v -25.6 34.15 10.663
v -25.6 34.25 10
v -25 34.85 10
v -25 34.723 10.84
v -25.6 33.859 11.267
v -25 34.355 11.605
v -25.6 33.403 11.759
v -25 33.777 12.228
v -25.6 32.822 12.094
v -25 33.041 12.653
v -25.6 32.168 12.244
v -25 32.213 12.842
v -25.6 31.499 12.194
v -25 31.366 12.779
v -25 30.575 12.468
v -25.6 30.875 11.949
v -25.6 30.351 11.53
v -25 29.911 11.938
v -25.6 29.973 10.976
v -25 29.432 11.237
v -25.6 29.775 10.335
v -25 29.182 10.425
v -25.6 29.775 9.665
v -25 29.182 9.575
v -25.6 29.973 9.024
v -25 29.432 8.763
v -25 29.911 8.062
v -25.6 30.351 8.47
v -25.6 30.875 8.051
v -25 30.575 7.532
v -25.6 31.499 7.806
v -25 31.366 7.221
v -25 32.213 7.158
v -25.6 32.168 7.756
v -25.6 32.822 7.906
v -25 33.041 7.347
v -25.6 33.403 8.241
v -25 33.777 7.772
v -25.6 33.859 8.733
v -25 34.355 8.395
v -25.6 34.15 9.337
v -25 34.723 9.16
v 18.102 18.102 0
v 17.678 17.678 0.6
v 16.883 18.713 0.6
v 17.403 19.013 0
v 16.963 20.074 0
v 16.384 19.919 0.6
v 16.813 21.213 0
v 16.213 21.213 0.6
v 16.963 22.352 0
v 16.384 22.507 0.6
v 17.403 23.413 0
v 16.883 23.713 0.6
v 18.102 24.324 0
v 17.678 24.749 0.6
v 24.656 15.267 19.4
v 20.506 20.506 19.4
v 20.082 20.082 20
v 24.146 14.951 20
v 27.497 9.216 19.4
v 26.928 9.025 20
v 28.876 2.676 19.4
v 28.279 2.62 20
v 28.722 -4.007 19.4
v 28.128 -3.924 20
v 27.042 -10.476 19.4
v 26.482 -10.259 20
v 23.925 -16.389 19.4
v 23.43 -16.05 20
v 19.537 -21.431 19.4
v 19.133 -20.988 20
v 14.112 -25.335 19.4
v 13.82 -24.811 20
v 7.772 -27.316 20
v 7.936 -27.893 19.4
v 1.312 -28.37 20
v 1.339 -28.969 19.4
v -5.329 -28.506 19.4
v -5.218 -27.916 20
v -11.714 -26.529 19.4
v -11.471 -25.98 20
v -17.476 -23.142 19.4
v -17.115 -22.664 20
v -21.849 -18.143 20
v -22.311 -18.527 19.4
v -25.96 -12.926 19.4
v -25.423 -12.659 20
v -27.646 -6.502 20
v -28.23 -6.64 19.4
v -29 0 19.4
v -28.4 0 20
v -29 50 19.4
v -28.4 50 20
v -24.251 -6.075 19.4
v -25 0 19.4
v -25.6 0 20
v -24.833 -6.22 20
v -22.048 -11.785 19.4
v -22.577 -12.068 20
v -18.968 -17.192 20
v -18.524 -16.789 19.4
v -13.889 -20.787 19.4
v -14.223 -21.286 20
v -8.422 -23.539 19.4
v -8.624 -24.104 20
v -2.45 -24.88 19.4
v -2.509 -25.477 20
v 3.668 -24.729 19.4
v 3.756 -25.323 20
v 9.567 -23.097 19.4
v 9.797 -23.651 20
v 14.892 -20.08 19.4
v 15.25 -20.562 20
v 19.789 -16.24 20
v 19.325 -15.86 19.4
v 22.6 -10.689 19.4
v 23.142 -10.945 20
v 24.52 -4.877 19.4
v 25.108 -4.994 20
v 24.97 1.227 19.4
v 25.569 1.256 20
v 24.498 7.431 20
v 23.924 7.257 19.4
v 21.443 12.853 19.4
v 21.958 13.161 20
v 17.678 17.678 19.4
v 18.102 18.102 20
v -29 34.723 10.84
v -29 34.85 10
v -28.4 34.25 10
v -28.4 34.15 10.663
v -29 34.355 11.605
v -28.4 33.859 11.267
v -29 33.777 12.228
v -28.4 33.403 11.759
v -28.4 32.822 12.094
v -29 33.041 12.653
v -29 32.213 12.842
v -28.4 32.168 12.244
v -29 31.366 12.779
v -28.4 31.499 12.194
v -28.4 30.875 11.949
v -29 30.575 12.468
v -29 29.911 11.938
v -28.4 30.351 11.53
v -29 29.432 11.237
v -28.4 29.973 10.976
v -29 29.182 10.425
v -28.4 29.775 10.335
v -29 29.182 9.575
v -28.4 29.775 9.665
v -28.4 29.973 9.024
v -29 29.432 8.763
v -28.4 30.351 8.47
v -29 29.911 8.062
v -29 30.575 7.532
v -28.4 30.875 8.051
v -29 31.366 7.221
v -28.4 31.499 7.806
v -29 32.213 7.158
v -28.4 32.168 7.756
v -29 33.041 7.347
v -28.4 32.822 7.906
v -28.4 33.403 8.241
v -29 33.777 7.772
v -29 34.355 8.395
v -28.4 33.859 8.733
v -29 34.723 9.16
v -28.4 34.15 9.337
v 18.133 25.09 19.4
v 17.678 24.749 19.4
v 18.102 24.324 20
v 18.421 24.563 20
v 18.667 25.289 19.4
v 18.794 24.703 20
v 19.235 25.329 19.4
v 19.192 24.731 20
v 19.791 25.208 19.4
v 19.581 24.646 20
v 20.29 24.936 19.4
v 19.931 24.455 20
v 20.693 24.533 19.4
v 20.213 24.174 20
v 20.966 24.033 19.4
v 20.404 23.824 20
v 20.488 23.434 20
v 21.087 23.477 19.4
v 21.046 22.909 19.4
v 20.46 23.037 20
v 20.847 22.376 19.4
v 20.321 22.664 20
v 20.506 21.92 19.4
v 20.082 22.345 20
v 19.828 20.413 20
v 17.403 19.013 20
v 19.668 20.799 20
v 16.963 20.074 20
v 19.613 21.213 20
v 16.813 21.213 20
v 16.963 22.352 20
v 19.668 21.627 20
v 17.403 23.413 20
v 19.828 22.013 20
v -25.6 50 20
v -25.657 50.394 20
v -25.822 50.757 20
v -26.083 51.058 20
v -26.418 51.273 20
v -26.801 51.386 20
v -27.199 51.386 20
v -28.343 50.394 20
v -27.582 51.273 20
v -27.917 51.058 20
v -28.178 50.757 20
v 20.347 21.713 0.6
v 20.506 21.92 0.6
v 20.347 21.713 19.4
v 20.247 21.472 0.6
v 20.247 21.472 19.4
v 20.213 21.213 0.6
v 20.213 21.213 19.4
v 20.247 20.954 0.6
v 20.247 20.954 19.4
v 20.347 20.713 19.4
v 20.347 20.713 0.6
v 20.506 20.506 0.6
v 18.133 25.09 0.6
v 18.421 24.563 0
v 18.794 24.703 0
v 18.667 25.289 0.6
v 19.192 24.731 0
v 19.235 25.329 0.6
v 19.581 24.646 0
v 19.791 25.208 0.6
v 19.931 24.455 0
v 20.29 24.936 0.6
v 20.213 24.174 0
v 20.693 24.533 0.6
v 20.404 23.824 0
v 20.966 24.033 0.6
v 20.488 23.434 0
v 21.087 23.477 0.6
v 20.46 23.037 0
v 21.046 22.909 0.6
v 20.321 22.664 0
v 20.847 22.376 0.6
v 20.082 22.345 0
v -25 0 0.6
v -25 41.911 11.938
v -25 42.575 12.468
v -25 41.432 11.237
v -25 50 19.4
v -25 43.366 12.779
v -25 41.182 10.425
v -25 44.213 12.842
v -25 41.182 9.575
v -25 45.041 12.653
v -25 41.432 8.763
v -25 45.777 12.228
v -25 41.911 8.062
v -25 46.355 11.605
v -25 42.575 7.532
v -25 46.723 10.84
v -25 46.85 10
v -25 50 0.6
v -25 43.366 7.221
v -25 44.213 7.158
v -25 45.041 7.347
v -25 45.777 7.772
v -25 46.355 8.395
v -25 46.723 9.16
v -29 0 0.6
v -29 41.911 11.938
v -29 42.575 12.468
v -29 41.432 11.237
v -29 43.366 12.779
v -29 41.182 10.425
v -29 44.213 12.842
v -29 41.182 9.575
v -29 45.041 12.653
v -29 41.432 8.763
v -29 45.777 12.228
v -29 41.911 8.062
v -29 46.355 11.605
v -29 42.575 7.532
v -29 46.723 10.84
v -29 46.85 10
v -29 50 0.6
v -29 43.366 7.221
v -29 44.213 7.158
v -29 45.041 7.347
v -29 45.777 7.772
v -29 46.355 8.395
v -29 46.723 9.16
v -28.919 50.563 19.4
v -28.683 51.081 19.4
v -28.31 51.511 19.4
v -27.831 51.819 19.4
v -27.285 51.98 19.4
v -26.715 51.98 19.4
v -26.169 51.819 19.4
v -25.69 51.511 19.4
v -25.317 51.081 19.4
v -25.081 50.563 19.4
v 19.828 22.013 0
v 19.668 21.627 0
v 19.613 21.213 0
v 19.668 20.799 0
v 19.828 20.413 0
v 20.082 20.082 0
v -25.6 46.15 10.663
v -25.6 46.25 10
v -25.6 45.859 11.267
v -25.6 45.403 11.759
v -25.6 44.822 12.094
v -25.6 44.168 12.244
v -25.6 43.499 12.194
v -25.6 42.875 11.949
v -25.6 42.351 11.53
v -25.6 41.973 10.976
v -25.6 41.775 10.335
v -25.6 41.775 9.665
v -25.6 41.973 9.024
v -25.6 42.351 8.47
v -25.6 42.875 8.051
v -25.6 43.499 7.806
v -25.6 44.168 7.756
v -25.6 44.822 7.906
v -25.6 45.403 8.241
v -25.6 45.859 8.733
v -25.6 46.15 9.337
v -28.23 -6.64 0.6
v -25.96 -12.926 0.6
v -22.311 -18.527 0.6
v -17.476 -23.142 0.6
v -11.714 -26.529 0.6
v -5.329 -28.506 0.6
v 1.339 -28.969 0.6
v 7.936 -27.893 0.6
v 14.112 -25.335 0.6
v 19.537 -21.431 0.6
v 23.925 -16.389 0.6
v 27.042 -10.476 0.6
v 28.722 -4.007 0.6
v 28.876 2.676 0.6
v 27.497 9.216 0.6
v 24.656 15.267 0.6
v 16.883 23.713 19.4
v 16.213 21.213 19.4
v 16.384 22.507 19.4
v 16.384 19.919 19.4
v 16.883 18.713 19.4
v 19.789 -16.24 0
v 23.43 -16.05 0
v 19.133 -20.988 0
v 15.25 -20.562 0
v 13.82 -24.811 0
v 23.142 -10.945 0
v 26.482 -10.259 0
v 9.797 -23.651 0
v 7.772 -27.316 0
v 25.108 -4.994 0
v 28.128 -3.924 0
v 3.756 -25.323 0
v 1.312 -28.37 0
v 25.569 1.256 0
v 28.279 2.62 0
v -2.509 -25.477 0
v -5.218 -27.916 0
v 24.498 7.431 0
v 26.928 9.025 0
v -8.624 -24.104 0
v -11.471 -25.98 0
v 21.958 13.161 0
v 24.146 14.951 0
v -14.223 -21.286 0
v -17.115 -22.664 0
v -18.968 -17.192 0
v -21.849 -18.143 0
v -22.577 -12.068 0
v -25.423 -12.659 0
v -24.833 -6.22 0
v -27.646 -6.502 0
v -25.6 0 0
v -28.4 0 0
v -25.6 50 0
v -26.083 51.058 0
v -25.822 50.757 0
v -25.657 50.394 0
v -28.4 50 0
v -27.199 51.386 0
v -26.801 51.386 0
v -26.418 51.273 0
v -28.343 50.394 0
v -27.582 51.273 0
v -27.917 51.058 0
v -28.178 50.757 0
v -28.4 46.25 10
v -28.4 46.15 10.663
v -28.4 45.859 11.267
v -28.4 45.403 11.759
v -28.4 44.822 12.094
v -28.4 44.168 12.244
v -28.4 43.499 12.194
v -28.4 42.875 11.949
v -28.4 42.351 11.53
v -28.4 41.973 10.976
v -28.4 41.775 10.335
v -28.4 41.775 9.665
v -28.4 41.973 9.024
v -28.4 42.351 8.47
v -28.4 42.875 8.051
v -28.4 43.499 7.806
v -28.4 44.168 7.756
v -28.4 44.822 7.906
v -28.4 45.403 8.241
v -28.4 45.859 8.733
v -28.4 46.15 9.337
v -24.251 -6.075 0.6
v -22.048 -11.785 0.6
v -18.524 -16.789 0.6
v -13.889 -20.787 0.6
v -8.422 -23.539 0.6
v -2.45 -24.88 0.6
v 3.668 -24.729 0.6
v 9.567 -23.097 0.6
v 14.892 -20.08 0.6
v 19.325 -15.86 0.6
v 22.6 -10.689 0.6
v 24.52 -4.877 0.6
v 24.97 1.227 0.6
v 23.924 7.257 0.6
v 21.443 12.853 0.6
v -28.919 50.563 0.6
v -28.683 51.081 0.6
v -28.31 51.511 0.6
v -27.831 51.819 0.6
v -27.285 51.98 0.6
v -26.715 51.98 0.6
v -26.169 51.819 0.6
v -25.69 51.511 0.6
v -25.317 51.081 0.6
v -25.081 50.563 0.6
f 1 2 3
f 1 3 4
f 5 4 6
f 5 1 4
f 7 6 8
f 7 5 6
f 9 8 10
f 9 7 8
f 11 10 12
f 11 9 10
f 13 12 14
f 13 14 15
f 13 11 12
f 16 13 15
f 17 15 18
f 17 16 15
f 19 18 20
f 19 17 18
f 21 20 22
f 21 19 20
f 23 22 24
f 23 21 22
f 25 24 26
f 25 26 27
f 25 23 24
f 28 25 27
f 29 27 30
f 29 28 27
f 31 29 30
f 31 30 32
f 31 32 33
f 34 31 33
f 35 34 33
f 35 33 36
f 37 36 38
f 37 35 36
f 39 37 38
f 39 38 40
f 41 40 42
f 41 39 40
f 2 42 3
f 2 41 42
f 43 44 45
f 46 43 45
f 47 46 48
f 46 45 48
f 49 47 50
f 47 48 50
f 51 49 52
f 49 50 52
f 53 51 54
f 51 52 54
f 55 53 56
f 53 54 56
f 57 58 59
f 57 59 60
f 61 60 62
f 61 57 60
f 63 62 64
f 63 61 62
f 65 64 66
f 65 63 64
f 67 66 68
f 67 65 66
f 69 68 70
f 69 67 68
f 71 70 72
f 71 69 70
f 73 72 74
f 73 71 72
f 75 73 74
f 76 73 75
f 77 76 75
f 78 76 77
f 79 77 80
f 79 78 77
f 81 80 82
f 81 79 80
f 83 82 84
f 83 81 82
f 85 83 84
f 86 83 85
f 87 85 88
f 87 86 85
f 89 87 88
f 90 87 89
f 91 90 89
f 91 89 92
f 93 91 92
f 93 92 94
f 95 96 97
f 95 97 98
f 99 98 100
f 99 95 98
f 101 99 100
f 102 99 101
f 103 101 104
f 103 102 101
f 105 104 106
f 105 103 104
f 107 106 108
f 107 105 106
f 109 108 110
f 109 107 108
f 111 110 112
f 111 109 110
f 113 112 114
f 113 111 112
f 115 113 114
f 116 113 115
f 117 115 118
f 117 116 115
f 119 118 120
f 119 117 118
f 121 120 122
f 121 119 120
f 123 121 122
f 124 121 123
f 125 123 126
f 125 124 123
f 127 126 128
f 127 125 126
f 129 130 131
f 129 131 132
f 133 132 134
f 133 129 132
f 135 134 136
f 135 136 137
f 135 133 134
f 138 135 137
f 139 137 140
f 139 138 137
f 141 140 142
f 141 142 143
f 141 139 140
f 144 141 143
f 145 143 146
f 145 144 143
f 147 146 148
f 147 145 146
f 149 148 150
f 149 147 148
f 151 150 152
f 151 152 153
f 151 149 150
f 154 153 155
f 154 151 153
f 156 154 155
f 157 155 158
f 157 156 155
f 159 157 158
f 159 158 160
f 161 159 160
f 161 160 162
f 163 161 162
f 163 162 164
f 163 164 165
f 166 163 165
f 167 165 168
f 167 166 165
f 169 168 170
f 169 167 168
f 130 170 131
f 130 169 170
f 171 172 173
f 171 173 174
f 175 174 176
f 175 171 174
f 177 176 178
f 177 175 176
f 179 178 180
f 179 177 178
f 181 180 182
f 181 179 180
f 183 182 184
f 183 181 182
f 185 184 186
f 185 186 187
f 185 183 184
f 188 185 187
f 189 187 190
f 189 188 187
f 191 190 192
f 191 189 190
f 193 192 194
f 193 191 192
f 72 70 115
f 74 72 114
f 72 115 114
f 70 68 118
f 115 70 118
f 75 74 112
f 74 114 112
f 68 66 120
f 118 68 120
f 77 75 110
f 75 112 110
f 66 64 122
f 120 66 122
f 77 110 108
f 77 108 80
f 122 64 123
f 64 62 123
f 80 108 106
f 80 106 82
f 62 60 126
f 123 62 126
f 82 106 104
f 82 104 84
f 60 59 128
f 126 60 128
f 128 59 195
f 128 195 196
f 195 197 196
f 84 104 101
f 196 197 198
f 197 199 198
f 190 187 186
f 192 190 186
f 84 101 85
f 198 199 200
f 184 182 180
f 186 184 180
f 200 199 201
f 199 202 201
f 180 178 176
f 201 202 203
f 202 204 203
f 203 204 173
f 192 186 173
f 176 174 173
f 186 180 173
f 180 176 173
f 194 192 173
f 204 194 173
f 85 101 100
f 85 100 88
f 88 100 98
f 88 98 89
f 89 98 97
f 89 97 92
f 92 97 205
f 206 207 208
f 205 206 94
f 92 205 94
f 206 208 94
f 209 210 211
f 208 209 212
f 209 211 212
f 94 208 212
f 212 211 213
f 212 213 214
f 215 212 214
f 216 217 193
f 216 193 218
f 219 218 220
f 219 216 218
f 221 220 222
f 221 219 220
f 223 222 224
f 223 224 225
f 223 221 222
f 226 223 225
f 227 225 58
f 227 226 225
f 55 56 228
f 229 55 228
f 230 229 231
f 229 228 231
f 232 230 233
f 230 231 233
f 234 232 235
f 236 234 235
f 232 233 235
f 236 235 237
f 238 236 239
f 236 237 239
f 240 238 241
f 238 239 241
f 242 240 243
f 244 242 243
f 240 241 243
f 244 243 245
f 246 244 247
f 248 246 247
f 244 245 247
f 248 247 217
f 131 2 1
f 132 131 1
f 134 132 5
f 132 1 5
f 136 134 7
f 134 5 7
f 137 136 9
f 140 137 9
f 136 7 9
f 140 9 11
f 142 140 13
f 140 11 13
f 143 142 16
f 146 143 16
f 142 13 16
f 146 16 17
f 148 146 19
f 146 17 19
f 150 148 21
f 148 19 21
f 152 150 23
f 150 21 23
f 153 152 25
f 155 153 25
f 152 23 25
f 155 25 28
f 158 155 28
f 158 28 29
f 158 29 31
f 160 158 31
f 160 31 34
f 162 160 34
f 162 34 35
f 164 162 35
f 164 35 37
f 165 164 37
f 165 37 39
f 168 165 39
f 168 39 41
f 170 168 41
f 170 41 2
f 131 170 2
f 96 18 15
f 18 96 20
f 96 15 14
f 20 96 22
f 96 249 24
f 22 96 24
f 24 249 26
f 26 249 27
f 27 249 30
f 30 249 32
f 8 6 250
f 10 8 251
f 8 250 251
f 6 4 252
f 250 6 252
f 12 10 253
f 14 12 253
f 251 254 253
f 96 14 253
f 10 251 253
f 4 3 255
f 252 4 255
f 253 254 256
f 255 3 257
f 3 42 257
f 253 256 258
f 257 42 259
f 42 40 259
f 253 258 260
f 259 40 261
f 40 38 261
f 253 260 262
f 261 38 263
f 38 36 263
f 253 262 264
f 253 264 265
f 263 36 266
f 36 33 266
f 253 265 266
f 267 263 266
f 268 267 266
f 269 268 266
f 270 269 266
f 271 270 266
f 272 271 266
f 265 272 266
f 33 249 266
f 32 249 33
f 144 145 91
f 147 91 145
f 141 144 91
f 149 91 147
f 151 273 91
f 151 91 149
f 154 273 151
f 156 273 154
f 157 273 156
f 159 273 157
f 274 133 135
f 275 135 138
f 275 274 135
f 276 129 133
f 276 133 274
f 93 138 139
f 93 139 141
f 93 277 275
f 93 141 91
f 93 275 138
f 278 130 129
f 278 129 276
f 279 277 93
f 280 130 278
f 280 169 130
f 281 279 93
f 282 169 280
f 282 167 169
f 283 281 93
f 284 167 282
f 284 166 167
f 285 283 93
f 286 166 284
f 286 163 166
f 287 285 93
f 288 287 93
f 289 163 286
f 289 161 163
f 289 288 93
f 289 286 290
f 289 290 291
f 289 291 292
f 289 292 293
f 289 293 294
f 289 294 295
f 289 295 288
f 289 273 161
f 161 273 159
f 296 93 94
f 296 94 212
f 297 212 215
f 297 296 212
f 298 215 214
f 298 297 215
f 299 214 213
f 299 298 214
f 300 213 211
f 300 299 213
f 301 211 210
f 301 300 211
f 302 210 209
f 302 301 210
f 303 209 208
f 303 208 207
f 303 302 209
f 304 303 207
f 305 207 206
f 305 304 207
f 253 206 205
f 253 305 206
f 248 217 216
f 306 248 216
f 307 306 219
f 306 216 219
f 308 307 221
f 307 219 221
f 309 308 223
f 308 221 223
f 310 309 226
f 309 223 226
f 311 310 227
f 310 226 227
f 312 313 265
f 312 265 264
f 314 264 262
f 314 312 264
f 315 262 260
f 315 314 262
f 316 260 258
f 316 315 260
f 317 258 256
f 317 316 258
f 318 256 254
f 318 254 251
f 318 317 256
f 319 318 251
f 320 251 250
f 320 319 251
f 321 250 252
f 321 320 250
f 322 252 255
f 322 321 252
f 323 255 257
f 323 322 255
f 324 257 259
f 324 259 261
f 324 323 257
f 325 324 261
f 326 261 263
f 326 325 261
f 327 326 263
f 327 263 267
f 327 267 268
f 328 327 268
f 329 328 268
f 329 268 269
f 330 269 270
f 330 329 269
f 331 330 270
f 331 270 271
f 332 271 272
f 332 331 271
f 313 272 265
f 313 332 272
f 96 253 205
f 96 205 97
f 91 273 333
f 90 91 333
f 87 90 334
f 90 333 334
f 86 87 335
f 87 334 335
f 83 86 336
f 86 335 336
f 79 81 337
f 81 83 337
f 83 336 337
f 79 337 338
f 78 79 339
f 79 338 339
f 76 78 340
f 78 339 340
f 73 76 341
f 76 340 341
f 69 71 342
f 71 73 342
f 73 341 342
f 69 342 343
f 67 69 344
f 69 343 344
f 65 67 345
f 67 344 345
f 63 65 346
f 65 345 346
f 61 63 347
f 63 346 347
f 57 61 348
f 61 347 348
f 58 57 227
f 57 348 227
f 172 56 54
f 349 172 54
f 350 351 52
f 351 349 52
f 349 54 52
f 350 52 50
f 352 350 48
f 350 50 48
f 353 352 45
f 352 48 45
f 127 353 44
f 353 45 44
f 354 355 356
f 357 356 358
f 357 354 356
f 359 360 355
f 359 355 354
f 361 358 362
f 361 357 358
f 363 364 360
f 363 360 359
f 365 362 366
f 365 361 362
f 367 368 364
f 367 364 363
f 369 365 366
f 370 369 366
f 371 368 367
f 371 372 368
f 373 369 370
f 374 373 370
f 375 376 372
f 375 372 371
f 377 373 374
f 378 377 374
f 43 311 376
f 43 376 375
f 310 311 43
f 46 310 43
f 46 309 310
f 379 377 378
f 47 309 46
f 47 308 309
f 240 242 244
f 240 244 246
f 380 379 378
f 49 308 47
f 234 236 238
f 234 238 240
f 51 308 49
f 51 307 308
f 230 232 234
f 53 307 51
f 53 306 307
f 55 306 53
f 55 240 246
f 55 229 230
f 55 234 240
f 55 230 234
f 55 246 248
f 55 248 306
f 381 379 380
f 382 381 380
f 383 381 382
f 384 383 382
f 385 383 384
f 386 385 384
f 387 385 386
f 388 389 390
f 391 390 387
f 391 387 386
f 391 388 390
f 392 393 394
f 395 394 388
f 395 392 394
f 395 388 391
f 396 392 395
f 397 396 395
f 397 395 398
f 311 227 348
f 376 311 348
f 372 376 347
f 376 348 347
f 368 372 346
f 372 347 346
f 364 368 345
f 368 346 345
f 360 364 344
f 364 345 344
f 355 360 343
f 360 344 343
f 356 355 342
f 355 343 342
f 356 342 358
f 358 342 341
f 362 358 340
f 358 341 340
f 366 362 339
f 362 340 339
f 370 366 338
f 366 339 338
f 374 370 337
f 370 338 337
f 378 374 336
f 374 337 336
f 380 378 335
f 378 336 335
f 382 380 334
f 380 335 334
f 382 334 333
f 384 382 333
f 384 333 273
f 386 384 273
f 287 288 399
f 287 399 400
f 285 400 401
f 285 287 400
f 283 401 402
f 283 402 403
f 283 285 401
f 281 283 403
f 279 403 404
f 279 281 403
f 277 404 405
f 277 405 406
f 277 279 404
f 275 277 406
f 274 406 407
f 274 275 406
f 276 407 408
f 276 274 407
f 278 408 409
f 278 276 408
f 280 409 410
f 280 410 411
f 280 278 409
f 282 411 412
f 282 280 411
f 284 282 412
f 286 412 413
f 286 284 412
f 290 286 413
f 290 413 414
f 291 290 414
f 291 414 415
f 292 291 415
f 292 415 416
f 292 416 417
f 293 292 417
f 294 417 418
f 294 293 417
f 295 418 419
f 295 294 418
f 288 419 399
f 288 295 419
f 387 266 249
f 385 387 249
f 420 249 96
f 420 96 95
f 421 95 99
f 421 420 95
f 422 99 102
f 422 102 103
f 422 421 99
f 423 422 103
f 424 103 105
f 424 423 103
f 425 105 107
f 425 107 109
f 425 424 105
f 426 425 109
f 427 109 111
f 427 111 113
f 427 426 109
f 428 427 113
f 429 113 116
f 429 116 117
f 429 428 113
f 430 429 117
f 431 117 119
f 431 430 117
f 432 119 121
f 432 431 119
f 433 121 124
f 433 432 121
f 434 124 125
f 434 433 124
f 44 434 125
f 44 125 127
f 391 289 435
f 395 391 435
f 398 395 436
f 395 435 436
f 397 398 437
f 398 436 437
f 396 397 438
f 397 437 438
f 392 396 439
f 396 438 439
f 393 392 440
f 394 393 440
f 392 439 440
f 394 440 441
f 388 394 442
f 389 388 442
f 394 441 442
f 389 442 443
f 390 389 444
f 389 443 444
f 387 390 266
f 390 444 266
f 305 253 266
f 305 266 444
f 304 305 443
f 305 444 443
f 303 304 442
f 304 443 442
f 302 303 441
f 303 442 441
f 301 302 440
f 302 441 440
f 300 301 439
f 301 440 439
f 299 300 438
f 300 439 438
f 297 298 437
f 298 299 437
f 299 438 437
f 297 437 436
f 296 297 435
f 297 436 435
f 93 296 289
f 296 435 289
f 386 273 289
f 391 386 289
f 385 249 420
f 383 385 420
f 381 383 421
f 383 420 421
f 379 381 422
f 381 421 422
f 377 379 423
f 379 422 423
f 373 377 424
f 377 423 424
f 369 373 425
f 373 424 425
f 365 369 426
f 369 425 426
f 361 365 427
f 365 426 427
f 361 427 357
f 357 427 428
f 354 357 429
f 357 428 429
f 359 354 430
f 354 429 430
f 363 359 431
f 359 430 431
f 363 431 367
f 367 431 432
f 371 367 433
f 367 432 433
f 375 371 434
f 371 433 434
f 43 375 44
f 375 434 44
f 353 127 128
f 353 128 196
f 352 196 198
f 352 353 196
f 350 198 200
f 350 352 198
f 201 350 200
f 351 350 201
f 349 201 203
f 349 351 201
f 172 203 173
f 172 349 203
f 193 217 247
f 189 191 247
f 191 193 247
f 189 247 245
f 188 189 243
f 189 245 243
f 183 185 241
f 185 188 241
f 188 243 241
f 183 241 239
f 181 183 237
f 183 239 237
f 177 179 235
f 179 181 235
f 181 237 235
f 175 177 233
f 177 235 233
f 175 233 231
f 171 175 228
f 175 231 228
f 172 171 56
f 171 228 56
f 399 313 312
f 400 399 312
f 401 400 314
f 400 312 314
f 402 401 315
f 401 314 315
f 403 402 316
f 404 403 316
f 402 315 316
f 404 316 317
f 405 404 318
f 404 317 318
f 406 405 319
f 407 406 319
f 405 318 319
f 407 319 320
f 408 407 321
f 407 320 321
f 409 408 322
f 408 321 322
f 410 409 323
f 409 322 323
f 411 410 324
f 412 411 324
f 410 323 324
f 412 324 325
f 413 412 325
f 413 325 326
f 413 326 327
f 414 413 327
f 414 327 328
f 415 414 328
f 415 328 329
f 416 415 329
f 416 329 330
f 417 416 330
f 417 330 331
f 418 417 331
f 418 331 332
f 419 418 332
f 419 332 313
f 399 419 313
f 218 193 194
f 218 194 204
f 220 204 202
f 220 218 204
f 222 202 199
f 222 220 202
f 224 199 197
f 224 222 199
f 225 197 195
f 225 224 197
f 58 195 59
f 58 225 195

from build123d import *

# Parameters (mm, degrees)
PAD_DEPTH    = 20
SKETCH001_R  = 2.25
POCKET_DEPTH = 5
CHAMFER_SIZE = 0.6


with BuildPart() as part:
    # Sketch → Pad (new body)
    with BuildSketch(Plane.XY):
        with BuildLine():
            ThreePointArc((-25, 0), (9.567086, -23.096988), (17.67767, 17.67767))
            ThreePointArc((17.67767, 24.748737), (16.213203, 21.213203), (17.67767, 17.67767))
            ThreePointArc((20.506097, 21.92031), (20.506097, 24.748737), (17.67767, 24.748737))
            ThreePointArc((20.506097, 21.92031), (20.213203, 21.213203), (20.506097, 20.506097))
            ThreePointArc((-29, 0), (11.09782, -26.792506), (20.506097, 20.506097))
            Line((-29, 0), (-29, 50))
            ThreePointArc((-25, 50), (-27, 52), (-29, 50))
            Line((-25, 0), (-25, 50))
        make_face()
    extrude(amount=PAD_DEPTH)

    # Sketch001 (on Face3 of Pad) → Pocket (cut)
    with BuildSketch(Plane.YZ.offset(-25)):
        with Locations((44, 10)):
            Circle(SKETCH001_R)
        with Locations((32, 10)):
            Circle(SKETCH001_R)
    extrude(amount=-POCKET_DEPTH, mode=Mode.SUBTRACT)

    # Chamfer
    chamfer_edges = [part.edges().sort_by_distance(p)[0] for p in [
        (-25, 29.75, 10),
        (-25, 41.75, 10),
        (-29, 25, 20),
        (-27, 52, 20),
        (-25, 25, 20),
        (9.567086, -23.096988, 20),
        (16.213203, 21.213203, 20),
        (20.506097, 24.748737, 20),
        (20.213203, 21.213203, 20),
        (11.09782, -26.792506, 20),
        (-29, 25, 0),
        (-27, 52, 0),
        (-25, 25, 0),
        (9.567086, -23.096988, 0),
        (16.213203, 21.213203, 0),
        (20.506097, 24.748737, 0),
        (20.213203, 21.213203, 0),
        (11.09782, -26.792506, 0),
        (-29, 29.75, 10),
        (-29, 41.75, 10),
    ]]
    chamfer(chamfer_edges, length=CHAMFER_SIZE)


solid = part.part
